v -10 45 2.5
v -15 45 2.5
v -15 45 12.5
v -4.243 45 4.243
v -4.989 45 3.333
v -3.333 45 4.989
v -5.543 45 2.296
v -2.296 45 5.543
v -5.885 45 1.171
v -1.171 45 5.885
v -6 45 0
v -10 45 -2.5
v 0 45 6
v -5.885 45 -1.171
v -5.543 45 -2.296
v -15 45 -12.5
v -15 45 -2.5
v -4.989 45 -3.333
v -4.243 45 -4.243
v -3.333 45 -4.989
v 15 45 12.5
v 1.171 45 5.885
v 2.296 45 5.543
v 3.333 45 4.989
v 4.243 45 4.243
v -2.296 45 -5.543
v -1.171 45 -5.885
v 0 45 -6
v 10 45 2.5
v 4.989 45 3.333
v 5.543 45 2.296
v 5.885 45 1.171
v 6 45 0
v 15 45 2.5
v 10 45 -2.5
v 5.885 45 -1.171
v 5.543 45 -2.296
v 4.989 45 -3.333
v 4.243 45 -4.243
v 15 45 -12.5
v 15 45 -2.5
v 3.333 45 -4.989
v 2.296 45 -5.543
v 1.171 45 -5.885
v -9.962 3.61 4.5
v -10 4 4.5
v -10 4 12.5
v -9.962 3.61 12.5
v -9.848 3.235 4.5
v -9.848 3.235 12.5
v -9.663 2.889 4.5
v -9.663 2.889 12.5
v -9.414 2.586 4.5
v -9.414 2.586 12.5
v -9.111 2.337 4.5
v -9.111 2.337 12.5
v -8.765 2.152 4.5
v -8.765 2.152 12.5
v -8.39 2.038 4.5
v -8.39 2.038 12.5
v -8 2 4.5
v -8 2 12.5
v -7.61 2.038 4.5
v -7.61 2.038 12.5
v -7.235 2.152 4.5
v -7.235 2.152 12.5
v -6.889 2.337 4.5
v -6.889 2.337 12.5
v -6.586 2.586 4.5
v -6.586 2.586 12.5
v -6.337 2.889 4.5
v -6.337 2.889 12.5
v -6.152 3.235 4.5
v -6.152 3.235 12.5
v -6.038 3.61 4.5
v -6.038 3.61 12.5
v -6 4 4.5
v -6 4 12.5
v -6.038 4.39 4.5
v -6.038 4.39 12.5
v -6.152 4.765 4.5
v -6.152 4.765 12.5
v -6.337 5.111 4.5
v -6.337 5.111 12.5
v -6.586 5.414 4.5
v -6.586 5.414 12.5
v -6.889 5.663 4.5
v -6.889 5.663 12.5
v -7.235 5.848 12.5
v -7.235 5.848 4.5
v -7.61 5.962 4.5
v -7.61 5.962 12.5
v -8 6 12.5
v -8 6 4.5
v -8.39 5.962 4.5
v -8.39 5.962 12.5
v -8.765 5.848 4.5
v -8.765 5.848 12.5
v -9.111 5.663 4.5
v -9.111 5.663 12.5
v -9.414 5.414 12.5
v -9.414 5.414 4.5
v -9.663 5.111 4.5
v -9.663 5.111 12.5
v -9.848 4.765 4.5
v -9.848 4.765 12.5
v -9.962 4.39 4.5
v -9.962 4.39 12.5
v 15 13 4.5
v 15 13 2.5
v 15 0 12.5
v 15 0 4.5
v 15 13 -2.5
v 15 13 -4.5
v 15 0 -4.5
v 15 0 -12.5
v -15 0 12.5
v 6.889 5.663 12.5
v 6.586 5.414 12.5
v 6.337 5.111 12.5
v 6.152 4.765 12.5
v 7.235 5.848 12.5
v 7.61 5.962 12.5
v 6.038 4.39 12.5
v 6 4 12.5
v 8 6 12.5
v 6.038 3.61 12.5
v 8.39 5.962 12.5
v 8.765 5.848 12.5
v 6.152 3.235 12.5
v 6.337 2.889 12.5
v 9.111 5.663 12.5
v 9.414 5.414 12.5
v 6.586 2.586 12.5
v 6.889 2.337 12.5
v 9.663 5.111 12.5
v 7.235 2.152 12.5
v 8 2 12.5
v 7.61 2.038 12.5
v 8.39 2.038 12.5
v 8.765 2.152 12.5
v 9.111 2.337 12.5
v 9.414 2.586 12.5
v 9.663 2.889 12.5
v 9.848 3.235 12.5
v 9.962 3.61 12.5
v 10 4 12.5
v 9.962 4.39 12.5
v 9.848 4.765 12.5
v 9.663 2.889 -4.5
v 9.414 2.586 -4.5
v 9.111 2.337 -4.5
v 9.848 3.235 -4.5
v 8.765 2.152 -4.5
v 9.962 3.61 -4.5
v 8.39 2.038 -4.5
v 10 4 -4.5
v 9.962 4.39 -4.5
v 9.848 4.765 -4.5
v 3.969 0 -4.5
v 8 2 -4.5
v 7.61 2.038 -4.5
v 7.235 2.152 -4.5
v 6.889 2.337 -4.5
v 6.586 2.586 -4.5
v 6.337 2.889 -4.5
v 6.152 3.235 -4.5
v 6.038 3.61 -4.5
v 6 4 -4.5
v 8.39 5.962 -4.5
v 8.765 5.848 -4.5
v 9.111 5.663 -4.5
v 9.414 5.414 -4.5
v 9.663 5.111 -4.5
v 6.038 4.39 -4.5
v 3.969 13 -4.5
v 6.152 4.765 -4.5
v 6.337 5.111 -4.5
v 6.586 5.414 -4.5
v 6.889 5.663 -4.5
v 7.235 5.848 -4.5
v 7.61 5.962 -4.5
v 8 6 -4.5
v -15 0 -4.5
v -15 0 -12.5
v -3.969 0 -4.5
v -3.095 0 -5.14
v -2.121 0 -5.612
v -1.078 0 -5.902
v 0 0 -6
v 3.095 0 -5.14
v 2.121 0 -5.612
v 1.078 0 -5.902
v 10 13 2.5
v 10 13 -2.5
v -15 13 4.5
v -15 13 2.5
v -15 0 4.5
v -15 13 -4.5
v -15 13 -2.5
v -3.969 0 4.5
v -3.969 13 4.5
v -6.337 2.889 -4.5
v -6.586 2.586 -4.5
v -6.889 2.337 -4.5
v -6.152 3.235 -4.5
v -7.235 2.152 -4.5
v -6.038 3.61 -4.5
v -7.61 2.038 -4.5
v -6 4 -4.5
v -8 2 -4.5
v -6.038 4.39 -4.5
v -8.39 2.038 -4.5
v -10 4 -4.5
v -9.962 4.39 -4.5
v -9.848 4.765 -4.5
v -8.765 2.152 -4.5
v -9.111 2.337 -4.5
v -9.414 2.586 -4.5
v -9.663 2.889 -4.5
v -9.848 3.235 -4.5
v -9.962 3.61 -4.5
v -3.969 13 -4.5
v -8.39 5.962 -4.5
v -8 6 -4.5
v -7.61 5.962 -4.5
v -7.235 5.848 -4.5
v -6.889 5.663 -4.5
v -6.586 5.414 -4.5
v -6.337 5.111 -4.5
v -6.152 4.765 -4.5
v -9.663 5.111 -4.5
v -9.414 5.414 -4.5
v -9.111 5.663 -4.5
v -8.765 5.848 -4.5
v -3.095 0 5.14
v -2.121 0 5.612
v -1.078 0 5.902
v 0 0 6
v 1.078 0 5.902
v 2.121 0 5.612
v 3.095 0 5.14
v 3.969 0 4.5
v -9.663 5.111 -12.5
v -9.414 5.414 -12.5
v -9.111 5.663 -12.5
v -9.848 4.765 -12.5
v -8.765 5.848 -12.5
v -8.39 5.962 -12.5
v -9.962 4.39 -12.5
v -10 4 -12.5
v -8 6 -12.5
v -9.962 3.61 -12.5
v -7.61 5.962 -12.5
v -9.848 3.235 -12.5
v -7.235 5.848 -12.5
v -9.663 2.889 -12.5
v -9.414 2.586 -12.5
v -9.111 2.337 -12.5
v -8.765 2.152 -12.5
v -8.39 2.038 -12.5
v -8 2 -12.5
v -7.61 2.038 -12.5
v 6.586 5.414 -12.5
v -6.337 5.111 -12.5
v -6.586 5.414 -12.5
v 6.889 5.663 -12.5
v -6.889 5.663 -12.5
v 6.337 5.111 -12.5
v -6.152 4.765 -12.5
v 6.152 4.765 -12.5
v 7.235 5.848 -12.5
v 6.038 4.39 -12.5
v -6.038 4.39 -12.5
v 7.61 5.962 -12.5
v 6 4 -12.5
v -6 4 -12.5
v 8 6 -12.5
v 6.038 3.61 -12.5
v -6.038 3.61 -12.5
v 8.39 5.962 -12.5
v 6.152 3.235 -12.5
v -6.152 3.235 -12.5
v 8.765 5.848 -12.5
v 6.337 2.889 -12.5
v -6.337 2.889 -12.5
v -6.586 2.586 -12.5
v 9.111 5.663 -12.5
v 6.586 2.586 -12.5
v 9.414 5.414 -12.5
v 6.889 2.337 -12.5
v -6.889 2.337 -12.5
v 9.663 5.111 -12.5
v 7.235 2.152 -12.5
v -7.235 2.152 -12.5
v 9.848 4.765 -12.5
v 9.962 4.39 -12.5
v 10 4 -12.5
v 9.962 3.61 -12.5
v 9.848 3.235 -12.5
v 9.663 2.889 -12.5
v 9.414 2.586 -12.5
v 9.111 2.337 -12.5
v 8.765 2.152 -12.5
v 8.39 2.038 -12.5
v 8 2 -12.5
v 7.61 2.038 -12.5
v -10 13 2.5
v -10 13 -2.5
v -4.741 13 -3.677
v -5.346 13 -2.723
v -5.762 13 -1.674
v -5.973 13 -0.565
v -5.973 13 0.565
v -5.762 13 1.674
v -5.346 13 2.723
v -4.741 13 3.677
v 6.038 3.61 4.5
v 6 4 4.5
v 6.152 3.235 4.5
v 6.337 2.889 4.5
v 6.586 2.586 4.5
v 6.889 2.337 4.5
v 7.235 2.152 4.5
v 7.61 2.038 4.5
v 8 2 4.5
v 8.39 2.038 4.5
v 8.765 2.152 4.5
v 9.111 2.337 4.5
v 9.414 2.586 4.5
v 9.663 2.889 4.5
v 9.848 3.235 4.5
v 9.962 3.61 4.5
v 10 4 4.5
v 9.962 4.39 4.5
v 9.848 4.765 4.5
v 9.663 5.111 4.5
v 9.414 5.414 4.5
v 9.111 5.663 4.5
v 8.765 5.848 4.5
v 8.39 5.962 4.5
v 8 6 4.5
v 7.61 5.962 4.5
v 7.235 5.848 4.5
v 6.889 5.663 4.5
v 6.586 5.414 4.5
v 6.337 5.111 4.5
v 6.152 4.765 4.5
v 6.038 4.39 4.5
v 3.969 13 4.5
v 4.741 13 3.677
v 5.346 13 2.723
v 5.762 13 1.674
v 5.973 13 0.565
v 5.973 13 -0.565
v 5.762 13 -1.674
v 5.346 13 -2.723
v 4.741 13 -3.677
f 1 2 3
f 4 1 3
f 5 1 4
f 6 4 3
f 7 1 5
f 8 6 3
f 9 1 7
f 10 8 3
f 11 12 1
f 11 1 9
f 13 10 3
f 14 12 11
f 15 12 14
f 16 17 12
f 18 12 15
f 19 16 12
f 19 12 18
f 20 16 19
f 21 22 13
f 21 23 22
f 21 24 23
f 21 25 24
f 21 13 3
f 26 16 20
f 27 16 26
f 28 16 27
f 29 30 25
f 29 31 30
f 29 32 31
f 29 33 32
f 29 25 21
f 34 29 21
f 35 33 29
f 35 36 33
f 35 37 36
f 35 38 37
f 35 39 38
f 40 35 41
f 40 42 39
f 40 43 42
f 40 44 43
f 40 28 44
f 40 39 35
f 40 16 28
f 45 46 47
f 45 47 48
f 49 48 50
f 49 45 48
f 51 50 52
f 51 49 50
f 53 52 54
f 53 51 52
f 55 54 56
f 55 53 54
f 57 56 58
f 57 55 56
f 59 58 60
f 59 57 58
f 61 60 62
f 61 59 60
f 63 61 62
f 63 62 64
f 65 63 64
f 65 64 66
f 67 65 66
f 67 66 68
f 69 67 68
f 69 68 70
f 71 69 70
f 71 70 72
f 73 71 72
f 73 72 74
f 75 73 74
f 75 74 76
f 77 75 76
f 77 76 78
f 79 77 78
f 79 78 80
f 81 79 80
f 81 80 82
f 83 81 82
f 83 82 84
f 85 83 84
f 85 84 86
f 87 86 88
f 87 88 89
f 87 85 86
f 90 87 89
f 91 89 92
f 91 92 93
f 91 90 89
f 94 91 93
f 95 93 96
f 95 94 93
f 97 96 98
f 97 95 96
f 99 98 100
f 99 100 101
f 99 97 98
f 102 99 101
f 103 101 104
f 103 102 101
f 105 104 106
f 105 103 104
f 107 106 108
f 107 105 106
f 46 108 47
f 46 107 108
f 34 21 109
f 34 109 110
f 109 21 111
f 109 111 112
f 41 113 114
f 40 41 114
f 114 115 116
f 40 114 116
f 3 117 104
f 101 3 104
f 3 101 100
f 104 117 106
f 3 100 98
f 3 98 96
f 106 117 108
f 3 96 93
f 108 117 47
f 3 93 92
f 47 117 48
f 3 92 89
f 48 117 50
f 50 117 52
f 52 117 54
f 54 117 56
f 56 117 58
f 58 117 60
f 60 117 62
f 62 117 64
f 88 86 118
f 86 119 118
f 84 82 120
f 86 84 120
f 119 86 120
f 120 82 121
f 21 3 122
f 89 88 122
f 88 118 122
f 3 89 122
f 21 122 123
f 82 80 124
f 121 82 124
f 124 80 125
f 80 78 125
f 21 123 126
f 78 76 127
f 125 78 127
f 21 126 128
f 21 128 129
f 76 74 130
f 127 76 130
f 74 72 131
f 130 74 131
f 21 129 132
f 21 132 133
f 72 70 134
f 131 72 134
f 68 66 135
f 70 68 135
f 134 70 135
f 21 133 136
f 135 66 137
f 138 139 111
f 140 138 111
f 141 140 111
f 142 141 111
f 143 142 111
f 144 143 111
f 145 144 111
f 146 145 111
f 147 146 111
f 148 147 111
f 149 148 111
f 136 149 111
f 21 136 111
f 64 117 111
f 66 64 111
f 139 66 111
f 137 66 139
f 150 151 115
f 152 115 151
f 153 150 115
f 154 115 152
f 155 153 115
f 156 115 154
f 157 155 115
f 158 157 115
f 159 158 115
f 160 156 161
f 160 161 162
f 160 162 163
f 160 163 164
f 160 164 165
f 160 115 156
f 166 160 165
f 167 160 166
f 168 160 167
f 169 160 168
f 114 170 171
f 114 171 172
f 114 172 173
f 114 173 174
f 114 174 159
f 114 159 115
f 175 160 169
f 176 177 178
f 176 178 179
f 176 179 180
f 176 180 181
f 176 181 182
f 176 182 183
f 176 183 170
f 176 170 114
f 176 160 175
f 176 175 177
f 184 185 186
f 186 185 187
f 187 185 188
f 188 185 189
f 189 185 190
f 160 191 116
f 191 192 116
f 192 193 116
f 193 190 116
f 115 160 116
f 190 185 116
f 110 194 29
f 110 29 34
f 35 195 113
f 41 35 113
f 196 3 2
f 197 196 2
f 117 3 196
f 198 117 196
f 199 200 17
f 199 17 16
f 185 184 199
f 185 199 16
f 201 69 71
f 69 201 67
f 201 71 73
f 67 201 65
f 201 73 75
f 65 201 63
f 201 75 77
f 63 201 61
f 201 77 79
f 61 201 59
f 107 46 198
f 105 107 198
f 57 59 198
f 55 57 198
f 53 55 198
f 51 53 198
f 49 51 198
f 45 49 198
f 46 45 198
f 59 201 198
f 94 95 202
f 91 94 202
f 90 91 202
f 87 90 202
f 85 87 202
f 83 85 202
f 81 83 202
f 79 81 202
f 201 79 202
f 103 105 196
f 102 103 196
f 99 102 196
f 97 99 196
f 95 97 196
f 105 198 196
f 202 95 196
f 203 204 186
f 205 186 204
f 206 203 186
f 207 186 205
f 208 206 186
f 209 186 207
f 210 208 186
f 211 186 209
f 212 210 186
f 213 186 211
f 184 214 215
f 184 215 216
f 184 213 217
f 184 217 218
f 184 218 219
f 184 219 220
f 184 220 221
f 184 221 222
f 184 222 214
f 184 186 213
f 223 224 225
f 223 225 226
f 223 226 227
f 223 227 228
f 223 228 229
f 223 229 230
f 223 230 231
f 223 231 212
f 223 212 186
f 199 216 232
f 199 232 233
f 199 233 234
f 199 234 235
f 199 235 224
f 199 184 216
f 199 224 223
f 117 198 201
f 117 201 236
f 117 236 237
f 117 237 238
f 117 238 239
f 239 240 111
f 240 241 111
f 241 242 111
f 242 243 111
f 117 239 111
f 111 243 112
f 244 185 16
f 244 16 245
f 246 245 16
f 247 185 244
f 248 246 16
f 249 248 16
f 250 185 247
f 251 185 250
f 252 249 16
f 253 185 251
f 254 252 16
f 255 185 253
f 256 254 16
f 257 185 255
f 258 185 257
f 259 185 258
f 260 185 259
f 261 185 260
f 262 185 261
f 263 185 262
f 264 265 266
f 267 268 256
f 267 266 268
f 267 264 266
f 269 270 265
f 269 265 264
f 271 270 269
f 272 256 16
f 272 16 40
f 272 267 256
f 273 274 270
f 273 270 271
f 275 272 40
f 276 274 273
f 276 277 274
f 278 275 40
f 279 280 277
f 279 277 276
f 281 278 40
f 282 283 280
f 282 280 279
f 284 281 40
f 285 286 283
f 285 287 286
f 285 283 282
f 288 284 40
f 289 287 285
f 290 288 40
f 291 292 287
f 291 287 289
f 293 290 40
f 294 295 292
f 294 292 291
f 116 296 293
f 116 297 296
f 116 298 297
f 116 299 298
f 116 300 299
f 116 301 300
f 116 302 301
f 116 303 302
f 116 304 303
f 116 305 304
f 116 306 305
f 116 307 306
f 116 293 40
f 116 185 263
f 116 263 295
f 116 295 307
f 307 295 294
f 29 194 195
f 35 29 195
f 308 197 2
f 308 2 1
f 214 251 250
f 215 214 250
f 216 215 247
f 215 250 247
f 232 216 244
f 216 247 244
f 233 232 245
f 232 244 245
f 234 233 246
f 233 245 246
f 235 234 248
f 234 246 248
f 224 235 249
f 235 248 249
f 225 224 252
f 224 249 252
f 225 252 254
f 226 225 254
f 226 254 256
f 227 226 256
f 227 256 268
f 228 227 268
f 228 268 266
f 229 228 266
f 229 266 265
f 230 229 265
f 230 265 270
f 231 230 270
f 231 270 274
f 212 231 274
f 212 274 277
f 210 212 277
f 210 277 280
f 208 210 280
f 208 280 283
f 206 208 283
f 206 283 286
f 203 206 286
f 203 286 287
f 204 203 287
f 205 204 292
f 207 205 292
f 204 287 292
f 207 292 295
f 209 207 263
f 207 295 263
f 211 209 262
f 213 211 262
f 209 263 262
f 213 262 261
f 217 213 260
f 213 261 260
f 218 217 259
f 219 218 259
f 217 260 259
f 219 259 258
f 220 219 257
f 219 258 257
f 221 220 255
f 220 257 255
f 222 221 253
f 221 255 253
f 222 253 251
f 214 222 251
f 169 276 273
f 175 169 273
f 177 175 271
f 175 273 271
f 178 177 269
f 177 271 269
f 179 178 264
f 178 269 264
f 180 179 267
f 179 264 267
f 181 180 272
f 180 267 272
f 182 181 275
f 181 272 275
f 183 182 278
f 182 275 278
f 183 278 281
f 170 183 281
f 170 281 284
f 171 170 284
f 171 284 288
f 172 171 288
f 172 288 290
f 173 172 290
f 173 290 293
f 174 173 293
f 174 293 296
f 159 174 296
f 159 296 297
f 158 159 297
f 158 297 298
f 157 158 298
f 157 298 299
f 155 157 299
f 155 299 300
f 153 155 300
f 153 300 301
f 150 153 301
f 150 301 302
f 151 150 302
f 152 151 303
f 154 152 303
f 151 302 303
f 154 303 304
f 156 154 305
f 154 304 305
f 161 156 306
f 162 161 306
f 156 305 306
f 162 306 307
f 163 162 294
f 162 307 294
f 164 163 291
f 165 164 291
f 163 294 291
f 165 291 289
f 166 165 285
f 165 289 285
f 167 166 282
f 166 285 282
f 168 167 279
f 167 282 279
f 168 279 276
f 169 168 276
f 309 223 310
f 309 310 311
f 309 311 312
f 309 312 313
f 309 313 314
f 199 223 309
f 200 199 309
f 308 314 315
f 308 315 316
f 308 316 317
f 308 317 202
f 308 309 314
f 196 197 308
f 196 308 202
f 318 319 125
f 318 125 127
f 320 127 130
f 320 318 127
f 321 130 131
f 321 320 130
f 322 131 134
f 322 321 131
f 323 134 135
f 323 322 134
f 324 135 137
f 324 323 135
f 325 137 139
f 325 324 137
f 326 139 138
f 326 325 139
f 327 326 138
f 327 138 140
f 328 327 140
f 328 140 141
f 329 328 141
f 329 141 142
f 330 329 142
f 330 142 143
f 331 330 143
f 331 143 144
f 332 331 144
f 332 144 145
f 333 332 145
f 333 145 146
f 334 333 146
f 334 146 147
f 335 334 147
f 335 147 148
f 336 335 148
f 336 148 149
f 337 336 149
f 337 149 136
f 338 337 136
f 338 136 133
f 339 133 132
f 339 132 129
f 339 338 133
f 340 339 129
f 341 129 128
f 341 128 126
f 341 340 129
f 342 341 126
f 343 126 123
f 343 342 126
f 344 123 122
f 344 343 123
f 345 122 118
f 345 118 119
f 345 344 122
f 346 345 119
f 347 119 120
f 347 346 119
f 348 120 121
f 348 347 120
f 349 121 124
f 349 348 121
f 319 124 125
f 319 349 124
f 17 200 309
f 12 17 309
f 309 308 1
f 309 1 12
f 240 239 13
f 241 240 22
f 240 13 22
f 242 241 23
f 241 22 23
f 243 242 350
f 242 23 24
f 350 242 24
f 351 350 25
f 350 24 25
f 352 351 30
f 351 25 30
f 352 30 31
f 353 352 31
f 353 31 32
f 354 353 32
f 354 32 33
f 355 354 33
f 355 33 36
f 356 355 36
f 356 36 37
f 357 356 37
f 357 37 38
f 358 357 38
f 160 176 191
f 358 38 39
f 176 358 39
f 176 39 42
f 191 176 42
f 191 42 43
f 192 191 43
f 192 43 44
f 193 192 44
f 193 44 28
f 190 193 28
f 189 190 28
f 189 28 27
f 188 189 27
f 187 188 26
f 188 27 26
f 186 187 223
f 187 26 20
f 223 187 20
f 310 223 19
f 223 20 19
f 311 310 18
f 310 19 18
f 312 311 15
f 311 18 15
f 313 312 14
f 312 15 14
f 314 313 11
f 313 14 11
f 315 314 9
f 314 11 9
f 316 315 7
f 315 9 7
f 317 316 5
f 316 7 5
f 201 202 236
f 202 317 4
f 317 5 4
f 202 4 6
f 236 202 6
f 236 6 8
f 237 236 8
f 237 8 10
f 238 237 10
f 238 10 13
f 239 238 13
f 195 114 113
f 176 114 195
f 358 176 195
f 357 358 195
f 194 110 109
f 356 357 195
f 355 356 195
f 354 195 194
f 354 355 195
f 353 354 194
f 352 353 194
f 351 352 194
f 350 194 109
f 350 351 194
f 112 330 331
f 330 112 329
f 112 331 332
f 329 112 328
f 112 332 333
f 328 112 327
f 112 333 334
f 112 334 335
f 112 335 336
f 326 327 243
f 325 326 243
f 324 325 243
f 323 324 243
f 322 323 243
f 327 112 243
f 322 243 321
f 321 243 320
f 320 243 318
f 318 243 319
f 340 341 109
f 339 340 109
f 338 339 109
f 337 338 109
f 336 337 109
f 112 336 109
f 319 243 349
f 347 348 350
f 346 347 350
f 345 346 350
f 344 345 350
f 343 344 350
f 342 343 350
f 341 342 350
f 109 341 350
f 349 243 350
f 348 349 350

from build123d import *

# Parameters (mm, degrees)
SKETCH1_W           = 30
SKETCH1_H           = 25
BOSS_EXTRUDE1_DEPTH = 45
SKETCH2_W           = 5
SKETCH2_H           = 5
CUT_EXTRUDE1_DEPTH  = 45
SKETCH4_R           = 2
CUT_EXTRUDE17_DEPTH = 9
SKETCH5_W           = 9
SKETCH5_H           = 13
CUT_EXTRUDE18_DEPTH = 56.509008278
CUT_EXTRUDE19_START = -9
SKETCH6_R           = 2
CUT_EXTRUDE19_DEPTH = 9
SKETCH7_R           = 6
CUT_EXTRUDE20_DEPTH = 50.053542176


with BuildPart() as part:
    # Sketch1 → Boss-Extrude1 (new body)
    with BuildSketch(Plane(origin=(0, 0, 0), x_dir=(1, 0, 0), z_dir=(0, 1, 0))):
        Rectangle(SKETCH1_W, SKETCH1_H)
    extrude(amount=BOSS_EXTRUDE1_DEPTH)

    # Sketch2 → Cut-Extrude1 (cut)
    with BuildSketch(Plane(origin=(0, 45, 0), x_dir=(1, 0, 0), z_dir=(0, 1, 0))):
        with Locations((12.5, 0)):
            Rectangle(SKETCH2_W, SKETCH2_H)
        with Locations((-12.5, 0)):
            Rectangle(SKETCH2_W, SKETCH2_H)
    extrude(amount=-CUT_EXTRUDE1_DEPTH, mode=Mode.SUBTRACT)

    # Sketch4 → Cut-Extrude17 (cut)
    with BuildSketch(Plane(origin=(0, 0, -12.5), x_dir=(-1, 0, 0), z_dir=(0, 0, -1))):
        with Locations((8, 4)):
            Circle(SKETCH4_R)
        with Locations((-8, 4)):
            Circle(SKETCH4_R)
    extrude(amount=-CUT_EXTRUDE17_DEPTH, mode=Mode.SUBTRACT)

    # Sketch5 → Cut-Extrude18 (cut, through all)
    with BuildSketch(Plane.ZY.offset(15)):
        with Locations((0, 6.5)):
            Rectangle(SKETCH5_W, SKETCH5_H)
    extrude(amount=-CUT_EXTRUDE18_DEPTH, mode=Mode.SUBTRACT)

    # Sketch6 → Cut-Extrude19 (cut)
    with BuildSketch(Plane.XY.offset(12.5).offset(CUT_EXTRUDE19_START)):
        with Locations(Location((8, 4, 0), (0, 0, 180))):
            Circle(SKETCH6_R)
        with Locations(Location((-8, 4, 0), (0, 0, 180))):
            Circle(SKETCH6_R)
    extrude(amount=CUT_EXTRUDE19_DEPTH, mode=Mode.SUBTRACT)

    # Sketch7 → Cut-Extrude20 (cut, through all)
    with BuildSketch(Plane(origin=(0, 45, 0), x_dir=(1, 0, 0), z_dir=(0, 1, 0))):
        with Locations(Location((0, 0, 0), (0, 0, 270))):
            Circle(SKETCH7_R)
    extrude(amount=-CUT_EXTRUDE20_DEPTH, mode=Mode.SUBTRACT)


solid = part.part
